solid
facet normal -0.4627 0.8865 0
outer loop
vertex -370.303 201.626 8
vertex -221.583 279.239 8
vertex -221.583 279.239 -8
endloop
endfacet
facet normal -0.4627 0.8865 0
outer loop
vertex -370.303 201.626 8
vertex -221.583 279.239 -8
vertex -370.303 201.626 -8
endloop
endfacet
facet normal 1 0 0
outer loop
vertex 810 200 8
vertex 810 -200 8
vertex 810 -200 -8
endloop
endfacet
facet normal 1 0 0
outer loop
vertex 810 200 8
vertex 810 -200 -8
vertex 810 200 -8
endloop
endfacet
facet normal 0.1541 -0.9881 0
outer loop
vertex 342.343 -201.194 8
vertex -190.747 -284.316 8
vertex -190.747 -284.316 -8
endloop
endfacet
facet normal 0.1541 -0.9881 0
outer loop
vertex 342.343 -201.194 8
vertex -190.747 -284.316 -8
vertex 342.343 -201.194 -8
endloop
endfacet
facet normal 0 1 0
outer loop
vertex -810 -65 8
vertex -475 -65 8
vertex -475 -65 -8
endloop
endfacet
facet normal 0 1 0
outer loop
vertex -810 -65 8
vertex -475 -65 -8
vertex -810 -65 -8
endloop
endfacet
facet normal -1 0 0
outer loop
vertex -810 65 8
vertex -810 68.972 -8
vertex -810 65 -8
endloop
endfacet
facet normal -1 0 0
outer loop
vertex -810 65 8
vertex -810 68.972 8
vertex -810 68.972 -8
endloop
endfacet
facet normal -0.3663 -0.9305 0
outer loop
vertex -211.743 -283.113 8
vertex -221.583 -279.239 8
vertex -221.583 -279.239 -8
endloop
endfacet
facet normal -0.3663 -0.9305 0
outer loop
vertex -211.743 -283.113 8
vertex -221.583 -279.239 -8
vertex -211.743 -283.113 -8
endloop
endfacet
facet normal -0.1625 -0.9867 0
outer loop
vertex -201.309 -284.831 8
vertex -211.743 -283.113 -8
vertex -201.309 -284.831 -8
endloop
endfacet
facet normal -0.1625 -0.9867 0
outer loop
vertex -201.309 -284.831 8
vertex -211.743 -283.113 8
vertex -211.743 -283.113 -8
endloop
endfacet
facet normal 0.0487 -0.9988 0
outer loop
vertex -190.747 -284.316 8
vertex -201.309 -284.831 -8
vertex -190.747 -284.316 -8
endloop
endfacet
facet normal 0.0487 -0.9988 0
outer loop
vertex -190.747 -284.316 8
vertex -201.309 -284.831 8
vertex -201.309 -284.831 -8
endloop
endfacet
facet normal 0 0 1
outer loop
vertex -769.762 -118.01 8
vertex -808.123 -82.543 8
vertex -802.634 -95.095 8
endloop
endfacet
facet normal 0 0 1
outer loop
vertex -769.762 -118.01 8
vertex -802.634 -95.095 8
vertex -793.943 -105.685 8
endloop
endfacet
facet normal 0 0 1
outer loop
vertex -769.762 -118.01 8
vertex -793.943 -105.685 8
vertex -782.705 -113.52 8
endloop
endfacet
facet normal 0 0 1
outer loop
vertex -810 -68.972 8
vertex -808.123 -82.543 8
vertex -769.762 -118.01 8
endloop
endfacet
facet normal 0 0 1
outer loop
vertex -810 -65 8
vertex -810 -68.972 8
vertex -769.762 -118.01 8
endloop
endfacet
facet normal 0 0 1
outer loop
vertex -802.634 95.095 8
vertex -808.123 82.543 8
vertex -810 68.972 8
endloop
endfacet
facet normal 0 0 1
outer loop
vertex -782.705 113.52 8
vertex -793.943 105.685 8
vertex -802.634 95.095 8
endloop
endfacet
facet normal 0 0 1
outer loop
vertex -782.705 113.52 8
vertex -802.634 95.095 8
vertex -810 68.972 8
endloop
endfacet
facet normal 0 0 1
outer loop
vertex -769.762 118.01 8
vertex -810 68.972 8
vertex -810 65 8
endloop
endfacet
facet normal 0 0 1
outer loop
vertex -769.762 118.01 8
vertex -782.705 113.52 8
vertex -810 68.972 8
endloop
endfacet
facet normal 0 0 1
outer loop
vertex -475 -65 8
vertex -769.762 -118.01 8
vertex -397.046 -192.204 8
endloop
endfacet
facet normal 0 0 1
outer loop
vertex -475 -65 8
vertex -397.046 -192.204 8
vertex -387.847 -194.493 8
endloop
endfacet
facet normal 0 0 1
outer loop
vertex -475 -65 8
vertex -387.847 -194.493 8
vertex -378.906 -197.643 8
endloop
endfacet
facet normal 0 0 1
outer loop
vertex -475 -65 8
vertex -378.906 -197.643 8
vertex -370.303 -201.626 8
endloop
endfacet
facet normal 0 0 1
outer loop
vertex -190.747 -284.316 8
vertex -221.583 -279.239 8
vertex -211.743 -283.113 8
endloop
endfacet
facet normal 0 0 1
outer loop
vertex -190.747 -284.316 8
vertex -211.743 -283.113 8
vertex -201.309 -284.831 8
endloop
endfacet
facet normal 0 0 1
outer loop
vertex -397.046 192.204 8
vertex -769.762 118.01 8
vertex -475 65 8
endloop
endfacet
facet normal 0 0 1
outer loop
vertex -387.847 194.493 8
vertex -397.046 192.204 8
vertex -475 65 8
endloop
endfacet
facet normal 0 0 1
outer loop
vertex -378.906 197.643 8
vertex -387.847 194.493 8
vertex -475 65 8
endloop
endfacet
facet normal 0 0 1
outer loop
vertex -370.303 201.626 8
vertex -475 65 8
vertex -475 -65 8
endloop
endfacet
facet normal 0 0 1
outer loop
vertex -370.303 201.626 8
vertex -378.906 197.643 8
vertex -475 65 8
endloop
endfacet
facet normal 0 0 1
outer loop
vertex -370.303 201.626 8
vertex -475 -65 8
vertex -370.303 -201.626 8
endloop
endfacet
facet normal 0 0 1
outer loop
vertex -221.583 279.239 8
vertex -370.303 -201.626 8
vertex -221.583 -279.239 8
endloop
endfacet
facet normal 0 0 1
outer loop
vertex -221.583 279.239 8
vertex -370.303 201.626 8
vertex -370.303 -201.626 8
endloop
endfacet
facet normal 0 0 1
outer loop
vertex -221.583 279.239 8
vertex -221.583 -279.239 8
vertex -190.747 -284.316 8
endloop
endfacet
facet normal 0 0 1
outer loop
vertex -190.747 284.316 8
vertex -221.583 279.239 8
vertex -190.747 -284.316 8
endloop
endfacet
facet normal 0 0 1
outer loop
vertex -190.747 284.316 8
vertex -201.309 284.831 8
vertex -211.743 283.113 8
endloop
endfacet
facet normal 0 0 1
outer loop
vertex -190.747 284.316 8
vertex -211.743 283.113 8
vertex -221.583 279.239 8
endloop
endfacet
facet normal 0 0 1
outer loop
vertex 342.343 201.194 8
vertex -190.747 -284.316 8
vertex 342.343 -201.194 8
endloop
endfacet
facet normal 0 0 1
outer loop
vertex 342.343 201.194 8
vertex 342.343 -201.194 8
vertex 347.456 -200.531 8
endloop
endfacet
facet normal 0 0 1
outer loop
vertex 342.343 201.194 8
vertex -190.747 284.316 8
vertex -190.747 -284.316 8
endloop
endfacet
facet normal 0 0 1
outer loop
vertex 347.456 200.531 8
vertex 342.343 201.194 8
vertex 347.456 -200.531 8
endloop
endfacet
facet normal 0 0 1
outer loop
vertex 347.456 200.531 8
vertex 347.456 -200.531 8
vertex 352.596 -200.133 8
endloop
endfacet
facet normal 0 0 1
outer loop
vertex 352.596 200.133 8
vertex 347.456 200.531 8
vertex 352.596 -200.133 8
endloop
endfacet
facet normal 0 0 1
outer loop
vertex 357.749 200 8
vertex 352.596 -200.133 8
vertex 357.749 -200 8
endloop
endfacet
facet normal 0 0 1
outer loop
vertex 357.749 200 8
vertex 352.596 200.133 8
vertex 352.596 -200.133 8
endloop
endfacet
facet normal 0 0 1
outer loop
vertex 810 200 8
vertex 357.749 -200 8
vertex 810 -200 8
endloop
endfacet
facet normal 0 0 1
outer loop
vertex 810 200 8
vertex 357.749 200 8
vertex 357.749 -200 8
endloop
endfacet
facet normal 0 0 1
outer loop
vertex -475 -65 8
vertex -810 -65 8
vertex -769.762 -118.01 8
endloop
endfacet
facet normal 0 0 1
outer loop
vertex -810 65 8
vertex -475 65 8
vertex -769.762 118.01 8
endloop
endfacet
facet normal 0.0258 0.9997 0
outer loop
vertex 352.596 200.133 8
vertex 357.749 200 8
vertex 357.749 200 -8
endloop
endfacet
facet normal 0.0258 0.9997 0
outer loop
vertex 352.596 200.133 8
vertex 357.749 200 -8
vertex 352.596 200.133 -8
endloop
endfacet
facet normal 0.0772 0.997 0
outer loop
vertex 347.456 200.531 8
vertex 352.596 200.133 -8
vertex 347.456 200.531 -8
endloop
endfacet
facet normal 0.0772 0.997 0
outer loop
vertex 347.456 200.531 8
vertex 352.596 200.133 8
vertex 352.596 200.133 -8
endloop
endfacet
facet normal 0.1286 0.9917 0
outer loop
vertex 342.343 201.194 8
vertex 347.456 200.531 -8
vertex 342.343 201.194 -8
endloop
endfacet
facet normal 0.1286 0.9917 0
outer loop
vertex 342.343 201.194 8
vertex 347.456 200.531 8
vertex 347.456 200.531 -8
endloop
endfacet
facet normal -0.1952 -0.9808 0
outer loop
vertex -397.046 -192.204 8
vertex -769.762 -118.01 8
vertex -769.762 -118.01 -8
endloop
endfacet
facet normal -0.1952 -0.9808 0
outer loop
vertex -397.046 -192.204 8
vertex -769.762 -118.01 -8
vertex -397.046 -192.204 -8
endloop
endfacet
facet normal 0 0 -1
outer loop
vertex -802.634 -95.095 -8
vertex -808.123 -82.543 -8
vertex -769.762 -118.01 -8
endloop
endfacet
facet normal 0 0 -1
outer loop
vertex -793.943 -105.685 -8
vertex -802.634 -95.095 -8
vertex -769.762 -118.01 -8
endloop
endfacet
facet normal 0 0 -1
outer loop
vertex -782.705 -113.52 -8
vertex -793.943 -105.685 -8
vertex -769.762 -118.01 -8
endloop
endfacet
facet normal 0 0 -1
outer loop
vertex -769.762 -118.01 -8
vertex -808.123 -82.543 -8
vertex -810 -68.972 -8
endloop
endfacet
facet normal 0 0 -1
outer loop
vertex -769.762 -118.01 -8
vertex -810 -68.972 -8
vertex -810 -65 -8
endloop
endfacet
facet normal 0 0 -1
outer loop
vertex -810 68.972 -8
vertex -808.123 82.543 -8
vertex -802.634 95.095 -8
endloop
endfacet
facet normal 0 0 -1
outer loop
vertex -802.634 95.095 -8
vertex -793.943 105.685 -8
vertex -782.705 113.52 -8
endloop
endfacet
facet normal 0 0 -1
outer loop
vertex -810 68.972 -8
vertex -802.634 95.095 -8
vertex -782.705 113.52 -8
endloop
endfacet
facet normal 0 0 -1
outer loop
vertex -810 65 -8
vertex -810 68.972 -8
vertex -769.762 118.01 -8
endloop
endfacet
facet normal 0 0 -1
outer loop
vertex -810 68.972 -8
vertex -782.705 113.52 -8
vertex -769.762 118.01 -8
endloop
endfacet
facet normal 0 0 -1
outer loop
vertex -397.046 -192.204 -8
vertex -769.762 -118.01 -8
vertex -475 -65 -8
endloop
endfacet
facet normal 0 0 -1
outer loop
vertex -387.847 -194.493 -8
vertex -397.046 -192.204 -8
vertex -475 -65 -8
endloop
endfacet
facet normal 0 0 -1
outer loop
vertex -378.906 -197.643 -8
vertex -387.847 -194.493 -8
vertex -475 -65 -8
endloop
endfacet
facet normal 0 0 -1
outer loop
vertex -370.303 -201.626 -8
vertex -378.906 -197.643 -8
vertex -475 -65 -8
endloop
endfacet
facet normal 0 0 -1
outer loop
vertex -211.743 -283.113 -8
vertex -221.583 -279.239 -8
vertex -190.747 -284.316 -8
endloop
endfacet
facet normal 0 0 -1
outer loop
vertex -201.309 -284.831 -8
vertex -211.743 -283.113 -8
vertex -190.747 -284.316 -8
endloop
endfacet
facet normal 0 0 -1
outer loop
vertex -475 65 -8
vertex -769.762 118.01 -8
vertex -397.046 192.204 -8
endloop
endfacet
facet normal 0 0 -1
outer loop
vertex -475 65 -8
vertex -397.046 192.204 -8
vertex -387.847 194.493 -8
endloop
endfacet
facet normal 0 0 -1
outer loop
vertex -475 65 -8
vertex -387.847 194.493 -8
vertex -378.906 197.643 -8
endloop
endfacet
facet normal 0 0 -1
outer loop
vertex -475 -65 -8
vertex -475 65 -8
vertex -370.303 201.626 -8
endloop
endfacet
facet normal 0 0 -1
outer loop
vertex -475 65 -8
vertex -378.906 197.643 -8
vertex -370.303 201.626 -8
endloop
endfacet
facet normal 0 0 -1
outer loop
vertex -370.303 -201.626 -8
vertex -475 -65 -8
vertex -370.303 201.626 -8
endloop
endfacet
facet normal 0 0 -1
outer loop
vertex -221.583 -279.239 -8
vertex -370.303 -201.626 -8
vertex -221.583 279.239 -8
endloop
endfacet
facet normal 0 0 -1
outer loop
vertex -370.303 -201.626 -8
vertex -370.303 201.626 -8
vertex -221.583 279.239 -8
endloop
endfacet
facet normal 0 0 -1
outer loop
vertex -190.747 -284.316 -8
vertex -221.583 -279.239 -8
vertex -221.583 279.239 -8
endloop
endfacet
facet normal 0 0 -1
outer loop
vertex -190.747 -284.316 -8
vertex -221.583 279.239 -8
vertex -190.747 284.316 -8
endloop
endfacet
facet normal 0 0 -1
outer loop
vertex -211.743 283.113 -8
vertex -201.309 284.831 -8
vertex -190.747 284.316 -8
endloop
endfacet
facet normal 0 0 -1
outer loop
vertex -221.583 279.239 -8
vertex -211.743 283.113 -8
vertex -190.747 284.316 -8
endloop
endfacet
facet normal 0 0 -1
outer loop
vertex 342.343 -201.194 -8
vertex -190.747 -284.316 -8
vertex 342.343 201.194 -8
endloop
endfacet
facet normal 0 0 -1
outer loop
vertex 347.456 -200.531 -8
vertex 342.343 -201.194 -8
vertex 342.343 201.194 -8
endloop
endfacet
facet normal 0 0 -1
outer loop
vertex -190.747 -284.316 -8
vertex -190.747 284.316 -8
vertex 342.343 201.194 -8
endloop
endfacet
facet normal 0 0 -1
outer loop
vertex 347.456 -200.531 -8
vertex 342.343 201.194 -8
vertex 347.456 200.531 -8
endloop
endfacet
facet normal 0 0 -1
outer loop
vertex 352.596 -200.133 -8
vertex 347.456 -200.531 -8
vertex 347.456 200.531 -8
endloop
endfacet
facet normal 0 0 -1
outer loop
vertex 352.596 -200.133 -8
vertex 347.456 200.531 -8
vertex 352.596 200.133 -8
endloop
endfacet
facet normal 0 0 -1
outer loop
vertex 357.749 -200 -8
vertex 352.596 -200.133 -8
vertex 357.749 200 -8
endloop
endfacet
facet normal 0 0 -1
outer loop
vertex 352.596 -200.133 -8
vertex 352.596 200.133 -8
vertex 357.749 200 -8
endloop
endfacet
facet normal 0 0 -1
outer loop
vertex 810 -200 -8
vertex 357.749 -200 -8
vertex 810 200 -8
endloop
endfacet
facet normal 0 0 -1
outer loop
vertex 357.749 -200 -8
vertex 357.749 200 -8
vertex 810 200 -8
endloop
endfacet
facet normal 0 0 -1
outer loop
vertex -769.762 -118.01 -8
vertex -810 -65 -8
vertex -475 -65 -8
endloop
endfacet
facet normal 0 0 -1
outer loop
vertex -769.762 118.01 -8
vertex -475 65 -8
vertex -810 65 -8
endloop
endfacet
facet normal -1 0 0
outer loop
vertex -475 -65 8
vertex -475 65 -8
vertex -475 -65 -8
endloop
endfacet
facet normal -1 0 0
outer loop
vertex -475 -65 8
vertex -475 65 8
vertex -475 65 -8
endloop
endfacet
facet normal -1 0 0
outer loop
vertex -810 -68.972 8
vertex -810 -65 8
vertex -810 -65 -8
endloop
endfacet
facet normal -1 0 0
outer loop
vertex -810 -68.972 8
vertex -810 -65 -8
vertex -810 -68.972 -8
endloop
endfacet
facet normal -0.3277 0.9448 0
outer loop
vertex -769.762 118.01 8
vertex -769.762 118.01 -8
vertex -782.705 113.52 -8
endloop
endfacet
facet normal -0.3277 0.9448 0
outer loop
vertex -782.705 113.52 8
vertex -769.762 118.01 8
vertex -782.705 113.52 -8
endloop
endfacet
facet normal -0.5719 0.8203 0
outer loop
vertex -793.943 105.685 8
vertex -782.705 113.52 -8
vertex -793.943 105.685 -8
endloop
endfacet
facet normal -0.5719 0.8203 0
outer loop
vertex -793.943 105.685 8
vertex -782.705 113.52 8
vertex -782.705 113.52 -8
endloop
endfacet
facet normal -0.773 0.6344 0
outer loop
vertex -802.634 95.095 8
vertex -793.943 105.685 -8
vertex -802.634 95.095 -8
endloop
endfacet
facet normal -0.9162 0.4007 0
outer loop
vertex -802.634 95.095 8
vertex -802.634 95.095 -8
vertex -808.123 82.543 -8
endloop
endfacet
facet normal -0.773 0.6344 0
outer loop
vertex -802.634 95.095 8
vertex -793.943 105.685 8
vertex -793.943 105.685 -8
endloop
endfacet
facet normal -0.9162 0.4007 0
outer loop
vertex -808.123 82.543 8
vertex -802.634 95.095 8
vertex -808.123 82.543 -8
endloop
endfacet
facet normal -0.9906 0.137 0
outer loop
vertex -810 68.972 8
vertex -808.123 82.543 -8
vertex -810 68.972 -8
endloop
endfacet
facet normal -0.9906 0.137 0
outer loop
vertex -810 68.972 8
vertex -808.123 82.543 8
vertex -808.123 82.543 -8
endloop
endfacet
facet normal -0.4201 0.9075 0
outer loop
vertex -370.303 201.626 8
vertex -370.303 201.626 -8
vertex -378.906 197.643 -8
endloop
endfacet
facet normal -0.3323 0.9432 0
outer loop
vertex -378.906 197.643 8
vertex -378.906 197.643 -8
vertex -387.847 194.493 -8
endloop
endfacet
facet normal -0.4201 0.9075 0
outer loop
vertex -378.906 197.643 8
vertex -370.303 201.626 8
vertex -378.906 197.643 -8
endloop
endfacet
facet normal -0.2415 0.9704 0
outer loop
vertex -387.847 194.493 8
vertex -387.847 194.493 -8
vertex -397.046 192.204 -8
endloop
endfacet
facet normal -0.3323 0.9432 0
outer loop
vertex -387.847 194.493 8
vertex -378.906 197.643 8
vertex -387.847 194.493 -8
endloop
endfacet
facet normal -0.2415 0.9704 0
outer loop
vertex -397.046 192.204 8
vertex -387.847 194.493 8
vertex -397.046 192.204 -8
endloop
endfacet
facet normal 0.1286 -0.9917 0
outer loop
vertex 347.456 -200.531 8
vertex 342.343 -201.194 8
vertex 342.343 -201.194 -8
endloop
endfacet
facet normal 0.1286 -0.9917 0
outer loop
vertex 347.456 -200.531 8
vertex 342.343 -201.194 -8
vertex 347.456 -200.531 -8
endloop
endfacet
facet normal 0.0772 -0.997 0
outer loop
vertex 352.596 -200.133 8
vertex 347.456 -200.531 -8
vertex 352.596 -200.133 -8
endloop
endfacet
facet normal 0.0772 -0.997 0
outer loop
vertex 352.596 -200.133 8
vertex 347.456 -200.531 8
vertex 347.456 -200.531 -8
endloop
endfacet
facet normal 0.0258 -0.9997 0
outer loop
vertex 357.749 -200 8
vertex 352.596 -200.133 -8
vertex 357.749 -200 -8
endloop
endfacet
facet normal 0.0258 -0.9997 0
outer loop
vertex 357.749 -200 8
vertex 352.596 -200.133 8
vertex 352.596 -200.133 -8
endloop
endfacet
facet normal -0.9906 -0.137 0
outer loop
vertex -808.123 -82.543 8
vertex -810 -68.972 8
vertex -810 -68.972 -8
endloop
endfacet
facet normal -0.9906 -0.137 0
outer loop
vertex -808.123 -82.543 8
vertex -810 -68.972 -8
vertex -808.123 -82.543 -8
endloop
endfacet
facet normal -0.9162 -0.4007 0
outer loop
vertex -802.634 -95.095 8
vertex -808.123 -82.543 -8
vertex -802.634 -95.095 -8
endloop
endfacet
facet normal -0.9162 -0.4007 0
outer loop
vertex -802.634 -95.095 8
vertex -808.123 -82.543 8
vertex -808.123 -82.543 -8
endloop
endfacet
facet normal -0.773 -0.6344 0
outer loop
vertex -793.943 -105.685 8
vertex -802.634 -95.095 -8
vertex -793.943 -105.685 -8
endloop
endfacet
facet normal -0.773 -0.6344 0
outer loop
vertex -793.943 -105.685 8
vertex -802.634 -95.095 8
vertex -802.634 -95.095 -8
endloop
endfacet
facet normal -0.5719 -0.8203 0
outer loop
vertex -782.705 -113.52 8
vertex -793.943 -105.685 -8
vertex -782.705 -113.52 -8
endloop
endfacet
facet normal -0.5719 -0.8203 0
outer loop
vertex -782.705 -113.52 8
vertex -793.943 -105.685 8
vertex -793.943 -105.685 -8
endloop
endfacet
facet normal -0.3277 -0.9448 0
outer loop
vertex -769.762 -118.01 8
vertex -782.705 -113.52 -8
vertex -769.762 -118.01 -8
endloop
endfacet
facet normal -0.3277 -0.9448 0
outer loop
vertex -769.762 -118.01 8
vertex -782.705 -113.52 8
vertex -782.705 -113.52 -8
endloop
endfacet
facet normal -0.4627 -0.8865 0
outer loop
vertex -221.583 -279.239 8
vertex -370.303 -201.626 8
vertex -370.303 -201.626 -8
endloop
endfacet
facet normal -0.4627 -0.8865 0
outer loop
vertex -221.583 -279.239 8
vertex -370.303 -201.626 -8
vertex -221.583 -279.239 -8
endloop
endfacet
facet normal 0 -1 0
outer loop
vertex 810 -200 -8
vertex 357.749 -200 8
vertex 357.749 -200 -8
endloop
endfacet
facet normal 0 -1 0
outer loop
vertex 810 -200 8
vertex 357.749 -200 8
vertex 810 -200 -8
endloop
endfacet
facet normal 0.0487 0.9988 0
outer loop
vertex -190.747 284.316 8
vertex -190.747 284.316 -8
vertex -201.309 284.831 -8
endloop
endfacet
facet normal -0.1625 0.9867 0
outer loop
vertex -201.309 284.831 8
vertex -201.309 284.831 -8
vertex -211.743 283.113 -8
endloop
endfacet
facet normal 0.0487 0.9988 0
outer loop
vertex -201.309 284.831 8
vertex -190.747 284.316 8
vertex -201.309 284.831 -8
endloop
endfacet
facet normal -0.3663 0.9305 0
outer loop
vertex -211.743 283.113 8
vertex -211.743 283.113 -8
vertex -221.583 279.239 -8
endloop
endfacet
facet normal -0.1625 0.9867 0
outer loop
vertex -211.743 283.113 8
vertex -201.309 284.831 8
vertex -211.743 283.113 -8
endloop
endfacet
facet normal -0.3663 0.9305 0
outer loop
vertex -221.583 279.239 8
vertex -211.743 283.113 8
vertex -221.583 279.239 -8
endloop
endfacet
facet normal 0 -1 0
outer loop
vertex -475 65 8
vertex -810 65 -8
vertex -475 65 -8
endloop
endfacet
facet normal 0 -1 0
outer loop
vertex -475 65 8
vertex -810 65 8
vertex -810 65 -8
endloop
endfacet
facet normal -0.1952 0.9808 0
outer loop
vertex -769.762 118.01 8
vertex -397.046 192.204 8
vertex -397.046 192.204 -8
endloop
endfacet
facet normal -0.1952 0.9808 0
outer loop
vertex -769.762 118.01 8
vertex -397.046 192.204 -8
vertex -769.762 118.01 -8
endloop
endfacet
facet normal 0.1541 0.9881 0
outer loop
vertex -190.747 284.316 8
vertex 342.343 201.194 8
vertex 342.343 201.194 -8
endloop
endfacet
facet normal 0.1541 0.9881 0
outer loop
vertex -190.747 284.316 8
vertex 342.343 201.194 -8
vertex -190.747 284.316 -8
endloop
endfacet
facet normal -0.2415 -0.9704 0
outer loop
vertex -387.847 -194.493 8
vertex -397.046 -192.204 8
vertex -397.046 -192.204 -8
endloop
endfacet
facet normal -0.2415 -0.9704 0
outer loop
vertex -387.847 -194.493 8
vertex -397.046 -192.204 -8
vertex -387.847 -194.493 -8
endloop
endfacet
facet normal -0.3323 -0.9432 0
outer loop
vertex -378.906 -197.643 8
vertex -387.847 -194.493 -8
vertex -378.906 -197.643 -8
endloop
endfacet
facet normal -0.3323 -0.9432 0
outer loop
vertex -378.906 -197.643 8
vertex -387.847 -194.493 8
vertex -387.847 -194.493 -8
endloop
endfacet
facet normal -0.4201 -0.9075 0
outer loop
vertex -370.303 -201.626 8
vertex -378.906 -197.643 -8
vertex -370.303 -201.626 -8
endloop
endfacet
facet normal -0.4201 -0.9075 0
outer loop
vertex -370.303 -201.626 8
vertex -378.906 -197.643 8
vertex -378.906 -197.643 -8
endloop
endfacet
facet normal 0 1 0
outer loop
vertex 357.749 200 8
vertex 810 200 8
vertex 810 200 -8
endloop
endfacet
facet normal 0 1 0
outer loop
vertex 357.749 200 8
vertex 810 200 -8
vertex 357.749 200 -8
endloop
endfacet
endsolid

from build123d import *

# Parameters (mm, degrees)
F1_DEPTH = 8


# Not quite as in the source:
# - ends of sketch curves that miss each other by under 0.0002 mm in the source are joined


with BuildPart() as f1:
    # F0 (on Top) → F1 (new body, symmetric)
    with BuildSketch(Plane.XY):
        with BuildLine():
            Line((-475, 65), (-475, -65))
            Line((-475, -65), (-810, -65))
            Line((-810, -65), (-810, -68.972132))
            ThreePointArc((-810, -68.972132), (-798.6528240235, -100.6889917911), (-769.7616321997, -118.0099800033))
            Line((-769.7616321997, -118.0099800033), (-397.046108, -192.203936))
            ThreePointArc((-397.046108, -192.203936), (-383.3390652577, -195.9623660974), (-370.3033040103, -201.6260880198))
            Line((-370.3033040103, -201.6260880198), (-221.58307, -279.239461))
            ThreePointArc((-221.58307, -279.239461), (-206.5717643435, -284.2486537093), (-190.746885103, -284.3157393396))
            Line((-190.746885103, -284.3157393396), (342.343109, -201.193898))
            ThreePointArc((342.343109, -201.193898), (350.023164587, -200.2989211876), (357.749411, -200))
            Line((357.749411, -200), (810, -200))
            Line((810, -200), (810, 200))
            Line((810, 200), (357.749411, 200))
            ThreePointArc((357.749411, 200), (350.023164587, 200.2989211876), (342.343108949, 201.1938976727))
            Line((342.343108949, 201.1938976727), (-190.746885, 284.31574))
            ThreePointArc((-190.746885, 284.31574), (-206.5717643435, 284.2486537093), (-221.5830694776, 279.2394599991))
            Line((-221.5830694776, 279.2394599991), (-370.303304, 201.626088))
            ThreePointArc((-370.303304, 201.626088), (-383.3390652577, 195.9623660974), (-397.0461080216, 192.2039361086))
            Line((-397.0461080216, 192.2039361086), (-769.761632, 118.009979))
            ThreePointArc((-769.761632, 118.009979), (-798.6528240235, 100.6889917911), (-810, 68.972132))
            Line((-810, 68.972132), (-810, 65))
            Line((-810, 65), (-475, 65))
        make_face()
    extrude(amount=F1_DEPTH, both=True)


solid = f1.part
